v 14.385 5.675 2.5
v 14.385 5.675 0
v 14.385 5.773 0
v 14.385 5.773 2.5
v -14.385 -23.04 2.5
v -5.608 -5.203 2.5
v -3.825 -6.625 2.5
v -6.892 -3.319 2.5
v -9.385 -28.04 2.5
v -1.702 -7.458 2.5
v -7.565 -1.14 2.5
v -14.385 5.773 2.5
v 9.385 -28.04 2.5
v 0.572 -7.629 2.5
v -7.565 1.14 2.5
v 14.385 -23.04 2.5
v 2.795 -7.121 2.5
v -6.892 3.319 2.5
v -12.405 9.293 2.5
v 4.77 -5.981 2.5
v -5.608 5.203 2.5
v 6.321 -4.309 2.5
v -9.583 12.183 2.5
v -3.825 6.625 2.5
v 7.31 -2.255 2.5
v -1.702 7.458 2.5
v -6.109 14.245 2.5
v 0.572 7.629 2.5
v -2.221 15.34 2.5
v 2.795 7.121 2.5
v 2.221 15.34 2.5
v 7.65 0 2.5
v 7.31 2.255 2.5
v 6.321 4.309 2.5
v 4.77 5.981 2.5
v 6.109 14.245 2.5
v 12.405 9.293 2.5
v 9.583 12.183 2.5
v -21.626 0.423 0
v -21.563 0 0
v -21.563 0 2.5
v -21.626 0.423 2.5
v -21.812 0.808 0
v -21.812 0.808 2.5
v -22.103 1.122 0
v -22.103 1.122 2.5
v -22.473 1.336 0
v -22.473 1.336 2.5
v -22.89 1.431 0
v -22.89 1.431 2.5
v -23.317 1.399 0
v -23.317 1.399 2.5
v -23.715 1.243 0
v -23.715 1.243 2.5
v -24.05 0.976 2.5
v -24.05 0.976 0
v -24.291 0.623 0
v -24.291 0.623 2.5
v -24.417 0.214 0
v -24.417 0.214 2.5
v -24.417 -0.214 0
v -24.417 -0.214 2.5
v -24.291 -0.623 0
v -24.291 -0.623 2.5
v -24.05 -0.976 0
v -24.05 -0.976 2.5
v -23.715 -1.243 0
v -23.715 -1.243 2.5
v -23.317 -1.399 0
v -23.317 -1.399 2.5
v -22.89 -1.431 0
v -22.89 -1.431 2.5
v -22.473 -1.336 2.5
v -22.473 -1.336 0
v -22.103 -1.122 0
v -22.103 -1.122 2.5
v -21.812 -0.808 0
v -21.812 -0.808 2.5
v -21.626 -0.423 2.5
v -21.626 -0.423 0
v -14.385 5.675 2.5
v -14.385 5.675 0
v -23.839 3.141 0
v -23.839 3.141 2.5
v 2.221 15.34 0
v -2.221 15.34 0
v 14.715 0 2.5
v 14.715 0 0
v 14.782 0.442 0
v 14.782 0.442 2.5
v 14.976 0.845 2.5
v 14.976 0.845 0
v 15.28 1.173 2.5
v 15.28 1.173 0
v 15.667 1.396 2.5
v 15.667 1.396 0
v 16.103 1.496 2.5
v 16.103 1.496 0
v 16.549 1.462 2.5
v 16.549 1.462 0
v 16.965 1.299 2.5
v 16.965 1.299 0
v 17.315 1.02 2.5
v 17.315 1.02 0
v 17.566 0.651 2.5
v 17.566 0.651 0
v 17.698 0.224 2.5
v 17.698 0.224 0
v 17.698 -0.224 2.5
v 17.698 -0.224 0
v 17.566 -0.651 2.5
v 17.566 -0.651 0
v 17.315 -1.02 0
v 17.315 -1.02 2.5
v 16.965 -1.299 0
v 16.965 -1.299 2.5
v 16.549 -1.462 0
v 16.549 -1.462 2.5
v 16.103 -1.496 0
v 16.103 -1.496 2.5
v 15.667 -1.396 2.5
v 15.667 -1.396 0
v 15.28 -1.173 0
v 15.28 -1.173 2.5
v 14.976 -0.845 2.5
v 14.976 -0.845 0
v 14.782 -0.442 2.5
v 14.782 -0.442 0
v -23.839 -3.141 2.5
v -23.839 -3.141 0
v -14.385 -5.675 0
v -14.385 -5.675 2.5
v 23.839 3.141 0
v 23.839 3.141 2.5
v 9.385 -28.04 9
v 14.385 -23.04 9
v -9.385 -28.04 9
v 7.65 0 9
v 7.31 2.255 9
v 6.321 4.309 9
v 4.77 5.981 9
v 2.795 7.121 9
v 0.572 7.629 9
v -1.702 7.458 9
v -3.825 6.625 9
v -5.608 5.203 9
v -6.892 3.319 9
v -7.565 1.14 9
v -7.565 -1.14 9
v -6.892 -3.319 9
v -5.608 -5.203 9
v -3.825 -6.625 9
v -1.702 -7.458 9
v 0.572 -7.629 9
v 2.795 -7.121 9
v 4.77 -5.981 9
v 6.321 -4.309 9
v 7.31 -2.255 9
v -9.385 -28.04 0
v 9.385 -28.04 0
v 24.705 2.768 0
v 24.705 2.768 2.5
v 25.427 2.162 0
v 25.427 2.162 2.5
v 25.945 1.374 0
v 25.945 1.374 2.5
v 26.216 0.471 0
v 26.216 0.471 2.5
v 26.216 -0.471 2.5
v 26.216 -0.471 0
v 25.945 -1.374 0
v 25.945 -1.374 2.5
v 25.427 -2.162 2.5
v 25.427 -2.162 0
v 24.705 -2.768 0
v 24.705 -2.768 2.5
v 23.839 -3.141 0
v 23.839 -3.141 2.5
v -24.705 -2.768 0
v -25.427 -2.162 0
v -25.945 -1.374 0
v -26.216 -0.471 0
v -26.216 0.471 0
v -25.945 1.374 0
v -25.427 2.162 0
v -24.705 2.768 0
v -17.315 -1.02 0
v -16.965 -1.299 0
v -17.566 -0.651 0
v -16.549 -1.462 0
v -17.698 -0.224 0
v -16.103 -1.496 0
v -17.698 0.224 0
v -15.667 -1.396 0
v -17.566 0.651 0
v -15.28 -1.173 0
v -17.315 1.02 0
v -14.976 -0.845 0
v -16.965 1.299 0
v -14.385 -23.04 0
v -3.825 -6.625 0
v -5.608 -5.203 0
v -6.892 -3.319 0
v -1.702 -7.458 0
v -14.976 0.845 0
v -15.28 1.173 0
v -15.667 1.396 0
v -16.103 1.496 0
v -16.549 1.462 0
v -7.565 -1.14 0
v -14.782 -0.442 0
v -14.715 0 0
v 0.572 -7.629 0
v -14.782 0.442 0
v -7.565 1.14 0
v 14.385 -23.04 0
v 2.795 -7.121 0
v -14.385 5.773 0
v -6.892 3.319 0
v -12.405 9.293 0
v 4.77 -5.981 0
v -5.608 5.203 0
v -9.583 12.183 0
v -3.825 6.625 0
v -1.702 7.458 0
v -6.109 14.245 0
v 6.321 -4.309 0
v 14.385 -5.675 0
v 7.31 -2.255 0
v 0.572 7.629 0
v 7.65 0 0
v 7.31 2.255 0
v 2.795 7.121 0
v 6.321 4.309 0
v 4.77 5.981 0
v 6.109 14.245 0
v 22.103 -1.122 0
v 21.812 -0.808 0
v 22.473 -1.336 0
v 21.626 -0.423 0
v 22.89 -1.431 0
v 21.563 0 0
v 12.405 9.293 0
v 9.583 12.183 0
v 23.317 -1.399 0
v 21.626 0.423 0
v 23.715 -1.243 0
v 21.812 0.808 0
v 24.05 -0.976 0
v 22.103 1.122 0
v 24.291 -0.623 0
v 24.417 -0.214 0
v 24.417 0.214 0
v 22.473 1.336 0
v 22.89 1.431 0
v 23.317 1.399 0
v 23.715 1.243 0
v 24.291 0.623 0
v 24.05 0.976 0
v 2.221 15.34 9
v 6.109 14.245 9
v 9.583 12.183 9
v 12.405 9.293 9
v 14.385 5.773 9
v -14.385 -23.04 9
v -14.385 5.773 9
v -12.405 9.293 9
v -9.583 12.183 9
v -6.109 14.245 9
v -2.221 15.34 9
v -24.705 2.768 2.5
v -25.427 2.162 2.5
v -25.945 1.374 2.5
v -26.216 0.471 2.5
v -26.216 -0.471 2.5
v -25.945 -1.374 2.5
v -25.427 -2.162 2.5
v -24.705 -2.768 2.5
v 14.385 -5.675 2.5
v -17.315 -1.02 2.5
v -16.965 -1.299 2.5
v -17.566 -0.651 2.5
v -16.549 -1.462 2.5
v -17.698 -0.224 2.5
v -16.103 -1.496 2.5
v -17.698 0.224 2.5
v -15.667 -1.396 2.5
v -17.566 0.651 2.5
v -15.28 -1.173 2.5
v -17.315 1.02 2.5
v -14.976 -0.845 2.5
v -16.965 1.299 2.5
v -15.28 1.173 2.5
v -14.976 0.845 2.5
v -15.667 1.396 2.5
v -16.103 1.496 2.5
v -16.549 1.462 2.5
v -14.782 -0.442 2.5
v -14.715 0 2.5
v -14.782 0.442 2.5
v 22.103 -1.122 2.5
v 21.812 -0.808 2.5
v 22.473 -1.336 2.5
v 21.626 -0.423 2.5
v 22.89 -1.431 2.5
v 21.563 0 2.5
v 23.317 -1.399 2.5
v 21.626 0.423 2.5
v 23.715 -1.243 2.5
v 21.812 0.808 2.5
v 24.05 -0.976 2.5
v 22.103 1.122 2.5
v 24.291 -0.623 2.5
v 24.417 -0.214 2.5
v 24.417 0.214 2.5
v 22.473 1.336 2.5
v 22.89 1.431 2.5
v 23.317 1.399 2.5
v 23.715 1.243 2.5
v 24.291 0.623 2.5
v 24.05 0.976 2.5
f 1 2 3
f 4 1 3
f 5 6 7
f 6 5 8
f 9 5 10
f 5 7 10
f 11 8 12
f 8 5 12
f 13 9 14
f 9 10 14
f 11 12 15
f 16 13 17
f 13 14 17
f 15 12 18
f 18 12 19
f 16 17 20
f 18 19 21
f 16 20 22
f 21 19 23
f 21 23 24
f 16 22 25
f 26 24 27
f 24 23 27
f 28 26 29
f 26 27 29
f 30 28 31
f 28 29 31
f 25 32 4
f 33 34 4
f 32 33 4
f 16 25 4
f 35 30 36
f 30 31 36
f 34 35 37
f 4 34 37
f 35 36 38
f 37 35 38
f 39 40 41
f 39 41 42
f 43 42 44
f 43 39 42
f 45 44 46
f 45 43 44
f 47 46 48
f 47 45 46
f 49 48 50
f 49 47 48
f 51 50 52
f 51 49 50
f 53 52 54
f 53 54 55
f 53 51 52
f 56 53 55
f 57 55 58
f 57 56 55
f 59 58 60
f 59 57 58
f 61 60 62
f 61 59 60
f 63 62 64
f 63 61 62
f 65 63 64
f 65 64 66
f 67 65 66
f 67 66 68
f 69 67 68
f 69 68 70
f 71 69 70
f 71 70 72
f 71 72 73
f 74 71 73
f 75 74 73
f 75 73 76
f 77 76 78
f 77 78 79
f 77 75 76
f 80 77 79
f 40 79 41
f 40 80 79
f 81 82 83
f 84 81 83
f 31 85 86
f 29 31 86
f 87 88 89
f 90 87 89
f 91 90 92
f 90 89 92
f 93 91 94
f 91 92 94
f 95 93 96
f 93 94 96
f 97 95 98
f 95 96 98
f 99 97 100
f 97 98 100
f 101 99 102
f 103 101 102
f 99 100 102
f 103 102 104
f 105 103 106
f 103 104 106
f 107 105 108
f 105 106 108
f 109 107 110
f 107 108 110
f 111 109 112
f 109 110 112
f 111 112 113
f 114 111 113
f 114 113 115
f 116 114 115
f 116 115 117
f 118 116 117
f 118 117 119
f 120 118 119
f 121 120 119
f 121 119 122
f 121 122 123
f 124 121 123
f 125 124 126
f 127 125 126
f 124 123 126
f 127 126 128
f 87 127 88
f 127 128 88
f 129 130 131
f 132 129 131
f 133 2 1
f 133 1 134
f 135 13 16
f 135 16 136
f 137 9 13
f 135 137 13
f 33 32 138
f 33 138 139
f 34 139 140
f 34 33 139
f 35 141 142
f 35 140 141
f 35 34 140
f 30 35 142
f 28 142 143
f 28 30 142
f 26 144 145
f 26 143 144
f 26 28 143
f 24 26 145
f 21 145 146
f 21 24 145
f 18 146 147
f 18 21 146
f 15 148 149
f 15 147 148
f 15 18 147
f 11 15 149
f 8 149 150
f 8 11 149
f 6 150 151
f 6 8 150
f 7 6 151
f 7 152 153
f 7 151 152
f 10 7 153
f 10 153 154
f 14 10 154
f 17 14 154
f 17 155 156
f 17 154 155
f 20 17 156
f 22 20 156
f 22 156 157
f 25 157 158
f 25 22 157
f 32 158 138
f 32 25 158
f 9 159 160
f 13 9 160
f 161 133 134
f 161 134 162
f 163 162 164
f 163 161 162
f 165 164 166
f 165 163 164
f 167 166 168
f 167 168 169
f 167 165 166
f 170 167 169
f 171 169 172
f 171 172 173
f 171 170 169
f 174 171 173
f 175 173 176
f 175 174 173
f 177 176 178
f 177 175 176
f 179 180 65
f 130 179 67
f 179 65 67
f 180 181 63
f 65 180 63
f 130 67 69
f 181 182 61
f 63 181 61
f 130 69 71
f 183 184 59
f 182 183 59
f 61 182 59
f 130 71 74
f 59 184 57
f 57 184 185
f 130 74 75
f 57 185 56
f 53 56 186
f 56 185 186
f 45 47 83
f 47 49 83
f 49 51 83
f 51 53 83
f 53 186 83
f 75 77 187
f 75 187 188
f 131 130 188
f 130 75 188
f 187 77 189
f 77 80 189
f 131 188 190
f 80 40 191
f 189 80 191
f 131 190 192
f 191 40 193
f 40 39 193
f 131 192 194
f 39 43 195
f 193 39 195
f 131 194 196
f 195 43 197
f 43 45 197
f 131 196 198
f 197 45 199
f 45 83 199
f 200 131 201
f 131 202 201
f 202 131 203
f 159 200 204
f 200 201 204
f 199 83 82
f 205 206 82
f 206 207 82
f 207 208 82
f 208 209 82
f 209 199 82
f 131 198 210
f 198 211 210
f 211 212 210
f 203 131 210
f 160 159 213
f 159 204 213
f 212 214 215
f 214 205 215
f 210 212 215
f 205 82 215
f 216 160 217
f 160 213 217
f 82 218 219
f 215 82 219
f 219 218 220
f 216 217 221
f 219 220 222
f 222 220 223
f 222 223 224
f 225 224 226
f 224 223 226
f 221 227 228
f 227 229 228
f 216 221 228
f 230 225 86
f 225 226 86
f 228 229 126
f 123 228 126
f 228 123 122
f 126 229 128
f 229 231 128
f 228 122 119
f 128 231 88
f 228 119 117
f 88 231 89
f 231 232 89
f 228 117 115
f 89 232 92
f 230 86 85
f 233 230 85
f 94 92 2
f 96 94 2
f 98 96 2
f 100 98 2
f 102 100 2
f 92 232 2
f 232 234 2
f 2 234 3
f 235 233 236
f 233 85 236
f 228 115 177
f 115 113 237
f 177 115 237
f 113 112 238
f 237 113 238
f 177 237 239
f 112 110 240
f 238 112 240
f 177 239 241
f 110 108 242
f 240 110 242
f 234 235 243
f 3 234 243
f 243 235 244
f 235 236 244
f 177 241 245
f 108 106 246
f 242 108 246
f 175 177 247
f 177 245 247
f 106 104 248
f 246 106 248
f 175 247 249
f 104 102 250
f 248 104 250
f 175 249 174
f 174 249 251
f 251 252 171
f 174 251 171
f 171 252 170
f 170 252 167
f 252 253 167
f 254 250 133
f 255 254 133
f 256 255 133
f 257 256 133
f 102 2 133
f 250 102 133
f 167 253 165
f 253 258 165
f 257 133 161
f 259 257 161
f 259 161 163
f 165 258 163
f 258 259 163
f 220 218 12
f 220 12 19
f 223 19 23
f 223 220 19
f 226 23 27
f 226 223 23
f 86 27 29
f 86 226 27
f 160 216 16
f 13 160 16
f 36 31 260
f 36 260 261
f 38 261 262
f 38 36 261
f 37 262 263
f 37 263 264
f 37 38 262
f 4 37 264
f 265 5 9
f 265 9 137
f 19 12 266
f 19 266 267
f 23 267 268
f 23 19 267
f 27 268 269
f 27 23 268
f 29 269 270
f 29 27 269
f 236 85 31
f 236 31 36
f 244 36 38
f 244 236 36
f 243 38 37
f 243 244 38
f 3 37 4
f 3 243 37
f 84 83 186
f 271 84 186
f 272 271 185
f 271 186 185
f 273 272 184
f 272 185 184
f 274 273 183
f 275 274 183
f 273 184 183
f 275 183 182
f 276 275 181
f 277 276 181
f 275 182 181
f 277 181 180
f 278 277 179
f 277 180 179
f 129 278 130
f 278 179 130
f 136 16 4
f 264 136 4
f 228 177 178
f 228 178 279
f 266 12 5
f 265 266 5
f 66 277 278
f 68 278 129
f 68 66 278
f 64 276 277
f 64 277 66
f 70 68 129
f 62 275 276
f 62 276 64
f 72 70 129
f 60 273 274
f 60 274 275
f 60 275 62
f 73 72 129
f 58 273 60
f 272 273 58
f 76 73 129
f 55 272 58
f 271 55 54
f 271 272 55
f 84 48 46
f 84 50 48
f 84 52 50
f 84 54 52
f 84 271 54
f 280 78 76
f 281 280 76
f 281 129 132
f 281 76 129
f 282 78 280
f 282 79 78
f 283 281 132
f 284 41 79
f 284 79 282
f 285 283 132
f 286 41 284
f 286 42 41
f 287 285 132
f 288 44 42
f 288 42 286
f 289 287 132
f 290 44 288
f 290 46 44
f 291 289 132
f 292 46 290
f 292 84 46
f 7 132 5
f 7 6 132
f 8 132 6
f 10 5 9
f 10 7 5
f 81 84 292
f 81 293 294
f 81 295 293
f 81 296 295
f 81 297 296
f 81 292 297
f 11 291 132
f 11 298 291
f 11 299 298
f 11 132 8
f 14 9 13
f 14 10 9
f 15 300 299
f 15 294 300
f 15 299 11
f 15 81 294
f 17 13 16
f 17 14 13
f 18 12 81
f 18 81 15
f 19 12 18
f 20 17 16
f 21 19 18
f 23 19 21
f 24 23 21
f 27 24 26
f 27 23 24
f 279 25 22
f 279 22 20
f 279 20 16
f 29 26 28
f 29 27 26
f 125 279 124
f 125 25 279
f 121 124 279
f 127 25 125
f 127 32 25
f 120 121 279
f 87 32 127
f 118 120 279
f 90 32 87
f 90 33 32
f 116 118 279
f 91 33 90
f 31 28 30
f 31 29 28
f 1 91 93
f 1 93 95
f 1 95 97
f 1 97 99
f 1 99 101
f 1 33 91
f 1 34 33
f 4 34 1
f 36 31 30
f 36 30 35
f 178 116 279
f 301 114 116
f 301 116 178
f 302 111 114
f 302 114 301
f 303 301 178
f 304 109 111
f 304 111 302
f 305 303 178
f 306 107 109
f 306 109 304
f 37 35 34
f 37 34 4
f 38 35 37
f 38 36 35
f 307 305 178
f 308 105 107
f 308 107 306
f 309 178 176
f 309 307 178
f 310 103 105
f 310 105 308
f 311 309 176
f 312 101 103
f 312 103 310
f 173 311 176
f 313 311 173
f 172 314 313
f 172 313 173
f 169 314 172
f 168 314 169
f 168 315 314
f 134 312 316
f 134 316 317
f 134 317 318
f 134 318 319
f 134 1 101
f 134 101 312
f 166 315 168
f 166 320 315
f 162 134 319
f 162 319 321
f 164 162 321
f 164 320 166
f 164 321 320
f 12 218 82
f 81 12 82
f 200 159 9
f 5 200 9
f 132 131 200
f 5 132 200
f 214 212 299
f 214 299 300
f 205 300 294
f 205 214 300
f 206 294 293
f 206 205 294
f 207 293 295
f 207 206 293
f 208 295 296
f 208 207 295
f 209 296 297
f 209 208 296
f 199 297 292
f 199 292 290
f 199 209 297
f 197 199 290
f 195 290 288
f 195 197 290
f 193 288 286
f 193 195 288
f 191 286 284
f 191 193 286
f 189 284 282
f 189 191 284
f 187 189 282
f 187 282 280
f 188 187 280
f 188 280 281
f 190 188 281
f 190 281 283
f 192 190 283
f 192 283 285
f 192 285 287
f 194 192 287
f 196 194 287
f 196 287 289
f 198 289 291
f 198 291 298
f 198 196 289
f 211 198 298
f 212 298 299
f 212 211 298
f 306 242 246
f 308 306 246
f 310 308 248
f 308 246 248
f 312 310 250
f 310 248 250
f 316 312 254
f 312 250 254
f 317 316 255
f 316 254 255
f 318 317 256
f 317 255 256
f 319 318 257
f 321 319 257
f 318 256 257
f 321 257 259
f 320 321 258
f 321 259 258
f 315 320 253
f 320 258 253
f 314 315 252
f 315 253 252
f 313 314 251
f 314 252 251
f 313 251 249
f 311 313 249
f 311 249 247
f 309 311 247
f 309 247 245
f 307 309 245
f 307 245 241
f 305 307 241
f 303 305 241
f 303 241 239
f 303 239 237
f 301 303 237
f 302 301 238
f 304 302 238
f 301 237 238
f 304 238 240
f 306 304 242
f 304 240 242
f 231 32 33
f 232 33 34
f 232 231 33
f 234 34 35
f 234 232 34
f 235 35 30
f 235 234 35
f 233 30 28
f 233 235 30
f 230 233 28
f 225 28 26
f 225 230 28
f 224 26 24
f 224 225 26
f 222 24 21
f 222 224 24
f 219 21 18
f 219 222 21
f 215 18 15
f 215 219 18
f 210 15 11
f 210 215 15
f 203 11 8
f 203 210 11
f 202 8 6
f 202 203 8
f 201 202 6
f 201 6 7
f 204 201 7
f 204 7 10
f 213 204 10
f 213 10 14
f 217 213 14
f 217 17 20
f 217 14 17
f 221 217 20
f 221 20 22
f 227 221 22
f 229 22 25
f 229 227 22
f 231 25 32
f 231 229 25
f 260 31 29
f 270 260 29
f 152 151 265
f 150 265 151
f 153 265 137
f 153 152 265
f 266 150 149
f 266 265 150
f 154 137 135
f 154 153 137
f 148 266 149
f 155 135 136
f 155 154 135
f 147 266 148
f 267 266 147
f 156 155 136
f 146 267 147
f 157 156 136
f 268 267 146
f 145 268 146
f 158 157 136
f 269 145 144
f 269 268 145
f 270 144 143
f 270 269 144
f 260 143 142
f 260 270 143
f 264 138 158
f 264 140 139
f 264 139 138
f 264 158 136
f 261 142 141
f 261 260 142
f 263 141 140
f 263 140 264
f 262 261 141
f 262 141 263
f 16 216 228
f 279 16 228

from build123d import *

# Parameters (mm, degrees)
EXTRUDE_1_DEPTH       = 2.5
EXTRUDE_START         = 2.5
EXTRUDE_3_DEPTH       = 6.5
CUT_EXTRUDE_2_DEPTH   = 9
SKETCH_2_R            = 7.65
CUT_EXTRUDE_4_DEPTH   = 33.774530126
EXTRUDE_2_OUTLINE_R   = 1.435
EXTRUDE_2_OUTLINE_R_2 = 1.5
EXTRUDE_2_DEPTH       = 2.5
CHAMFER_1_SIZE        = 5
CHAMFER_2_SIZE        = 5


# Read off the part's stored shape, not the designer's step: Бобышка-Вытянуть2
with BuildPart() as part:
    # Эскиз1 → Бобышка-Вытянуть1 (new body)
    with BuildSketch(Plane.XY):
        Polygon((14.385, 15.34), (0, 15.34), (-14.385, 15.34), (-14.385, -28.04), (14.385, -28.04), align=None)
    extrude(amount=EXTRUDE_1_DEPTH)


with BuildPart() as body_2:
    # Эскиз1<3> → Бобышка-Вытянуть3 (new body)
    with BuildSketch(Plane.XY.offset(EXTRUDE_START)):
        Polygon((14.385, 15.34), (0, 15.34), (-14.385, 15.34), (-14.385, -28.04), (14.385, -28.04), align=None)
    extrude(amount=EXTRUDE_3_DEPTH)


with BuildPart() as cut_extrude_2_tool:
    # Эскиз3 → Вырез-Вытянуть2 (new body)
    with BuildSketch(Plane.XY):
        with BuildLine():
            Line((-14.385, 15.34), (-14.385, 5.772501624))
            ThreePointArc((-14.385, 5.772501624), (-9.582639468, 12.182898703), (-2.22135094, 15.34))
            Line((-2.22135094, 15.34), (-14.385, 15.34))
        make_face()
        with BuildLine():
            Line((14.385, 15.34), (2.22135094, 15.34))
            ThreePointArc((2.22135094, 15.34), (9.582639468, 12.182898703), (14.385, 5.772501624))
            Line((14.385, 5.772501624), (14.385, 15.34))
        make_face()
    extrude(amount=CUT_EXTRUDE_2_DEPTH)


with BuildPart() as part_1:
    add(part.part)

    # Вырез-Вытянуть2: cut by cut_extrude_2_tool
    add(cut_extrude_2_tool.part, mode=Mode.SUBTRACT)


with BuildPart() as body_2_1:
    add(body_2.part)

    # Вырез-Вытянуть2: cut by cut_extrude_2_tool
    add(cut_extrude_2_tool.part, mode=Mode.SUBTRACT)


with BuildPart() as cut_extrude_4_tool:
    # Эскиз2 → Вырез-Вытянуть4 (new, through all)
    with BuildSketch(Plane.XY):
        Circle(SKETCH_2_R)
    extrude(amount=CUT_EXTRUDE_4_DEPTH)


with BuildPart() as part_2:
    add(part_1.part)

    # Вырез-Вытянуть4: cut by cut_extrude_4_tool
    add(cut_extrude_4_tool.part, mode=Mode.SUBTRACT)

    # Бобышка-Вытянуть2 outline → Бобышка-Вытянуть2 (add)
    with BuildSketch(Plane.XY):
        with BuildLine():
            ThreePointArc((-23.83947488, 3.141457498), (-26.25, 0), (-23.83947488, -3.141457498))
            Line((-23.83947488, -3.141457498), (-14.385, -5.674776407))
            Line((-14.385, -5.674776407), (-14.385, 5.674776407))
            Line((-14.385, 5.674776407), (-23.83947488, 3.141457498))
        make_face()
        with Locations((-22.997723881, 0)):
            Circle(EXTRUDE_2_OUTLINE_R, mode=Mode.SUBTRACT)
        with Locations((-16.215, 0)):
            Circle(EXTRUDE_2_OUTLINE_R_2, mode=Mode.SUBTRACT)
    extrude_2 = extrude(amount=EXTRUDE_2_DEPTH)

    # Зеркальное отражение1: Бобышка-Вытянуть2 across plane
    add(extrude_2.mirror(Plane(origin=(0, 0, 0), x_dir=(0, 0, 1), z_dir=(1, 0, 0))))

    # Фаска1
    chamfer_1_edges = [part_2.edges().sort_by_distance(p)[0] for p in [
        (14.385, -28.04, 1.25),
        (-14.385, -28.04, 1.25),
    ]]
    chamfer(chamfer_1_edges, length=CHAMFER_1_SIZE)


with BuildPart() as body_2_2:
    add(body_2_1.part)

    # Вырез-Вытянуть4: cut by cut_extrude_4_tool
    add(cut_extrude_4_tool.part, mode=Mode.SUBTRACT)

    # Фаска2
    chamfer_2_edges = [body_2_2.edges().sort_by_distance(p)[0] for p in [
        (14.385, -28.04, 5.75),
        (-14.385, -28.04, 5.75),
    ]]
    chamfer(chamfer_2_edges, length=CHAMFER_2_SIZE)


solid = Compound([part_2.part, body_2_2.part])
